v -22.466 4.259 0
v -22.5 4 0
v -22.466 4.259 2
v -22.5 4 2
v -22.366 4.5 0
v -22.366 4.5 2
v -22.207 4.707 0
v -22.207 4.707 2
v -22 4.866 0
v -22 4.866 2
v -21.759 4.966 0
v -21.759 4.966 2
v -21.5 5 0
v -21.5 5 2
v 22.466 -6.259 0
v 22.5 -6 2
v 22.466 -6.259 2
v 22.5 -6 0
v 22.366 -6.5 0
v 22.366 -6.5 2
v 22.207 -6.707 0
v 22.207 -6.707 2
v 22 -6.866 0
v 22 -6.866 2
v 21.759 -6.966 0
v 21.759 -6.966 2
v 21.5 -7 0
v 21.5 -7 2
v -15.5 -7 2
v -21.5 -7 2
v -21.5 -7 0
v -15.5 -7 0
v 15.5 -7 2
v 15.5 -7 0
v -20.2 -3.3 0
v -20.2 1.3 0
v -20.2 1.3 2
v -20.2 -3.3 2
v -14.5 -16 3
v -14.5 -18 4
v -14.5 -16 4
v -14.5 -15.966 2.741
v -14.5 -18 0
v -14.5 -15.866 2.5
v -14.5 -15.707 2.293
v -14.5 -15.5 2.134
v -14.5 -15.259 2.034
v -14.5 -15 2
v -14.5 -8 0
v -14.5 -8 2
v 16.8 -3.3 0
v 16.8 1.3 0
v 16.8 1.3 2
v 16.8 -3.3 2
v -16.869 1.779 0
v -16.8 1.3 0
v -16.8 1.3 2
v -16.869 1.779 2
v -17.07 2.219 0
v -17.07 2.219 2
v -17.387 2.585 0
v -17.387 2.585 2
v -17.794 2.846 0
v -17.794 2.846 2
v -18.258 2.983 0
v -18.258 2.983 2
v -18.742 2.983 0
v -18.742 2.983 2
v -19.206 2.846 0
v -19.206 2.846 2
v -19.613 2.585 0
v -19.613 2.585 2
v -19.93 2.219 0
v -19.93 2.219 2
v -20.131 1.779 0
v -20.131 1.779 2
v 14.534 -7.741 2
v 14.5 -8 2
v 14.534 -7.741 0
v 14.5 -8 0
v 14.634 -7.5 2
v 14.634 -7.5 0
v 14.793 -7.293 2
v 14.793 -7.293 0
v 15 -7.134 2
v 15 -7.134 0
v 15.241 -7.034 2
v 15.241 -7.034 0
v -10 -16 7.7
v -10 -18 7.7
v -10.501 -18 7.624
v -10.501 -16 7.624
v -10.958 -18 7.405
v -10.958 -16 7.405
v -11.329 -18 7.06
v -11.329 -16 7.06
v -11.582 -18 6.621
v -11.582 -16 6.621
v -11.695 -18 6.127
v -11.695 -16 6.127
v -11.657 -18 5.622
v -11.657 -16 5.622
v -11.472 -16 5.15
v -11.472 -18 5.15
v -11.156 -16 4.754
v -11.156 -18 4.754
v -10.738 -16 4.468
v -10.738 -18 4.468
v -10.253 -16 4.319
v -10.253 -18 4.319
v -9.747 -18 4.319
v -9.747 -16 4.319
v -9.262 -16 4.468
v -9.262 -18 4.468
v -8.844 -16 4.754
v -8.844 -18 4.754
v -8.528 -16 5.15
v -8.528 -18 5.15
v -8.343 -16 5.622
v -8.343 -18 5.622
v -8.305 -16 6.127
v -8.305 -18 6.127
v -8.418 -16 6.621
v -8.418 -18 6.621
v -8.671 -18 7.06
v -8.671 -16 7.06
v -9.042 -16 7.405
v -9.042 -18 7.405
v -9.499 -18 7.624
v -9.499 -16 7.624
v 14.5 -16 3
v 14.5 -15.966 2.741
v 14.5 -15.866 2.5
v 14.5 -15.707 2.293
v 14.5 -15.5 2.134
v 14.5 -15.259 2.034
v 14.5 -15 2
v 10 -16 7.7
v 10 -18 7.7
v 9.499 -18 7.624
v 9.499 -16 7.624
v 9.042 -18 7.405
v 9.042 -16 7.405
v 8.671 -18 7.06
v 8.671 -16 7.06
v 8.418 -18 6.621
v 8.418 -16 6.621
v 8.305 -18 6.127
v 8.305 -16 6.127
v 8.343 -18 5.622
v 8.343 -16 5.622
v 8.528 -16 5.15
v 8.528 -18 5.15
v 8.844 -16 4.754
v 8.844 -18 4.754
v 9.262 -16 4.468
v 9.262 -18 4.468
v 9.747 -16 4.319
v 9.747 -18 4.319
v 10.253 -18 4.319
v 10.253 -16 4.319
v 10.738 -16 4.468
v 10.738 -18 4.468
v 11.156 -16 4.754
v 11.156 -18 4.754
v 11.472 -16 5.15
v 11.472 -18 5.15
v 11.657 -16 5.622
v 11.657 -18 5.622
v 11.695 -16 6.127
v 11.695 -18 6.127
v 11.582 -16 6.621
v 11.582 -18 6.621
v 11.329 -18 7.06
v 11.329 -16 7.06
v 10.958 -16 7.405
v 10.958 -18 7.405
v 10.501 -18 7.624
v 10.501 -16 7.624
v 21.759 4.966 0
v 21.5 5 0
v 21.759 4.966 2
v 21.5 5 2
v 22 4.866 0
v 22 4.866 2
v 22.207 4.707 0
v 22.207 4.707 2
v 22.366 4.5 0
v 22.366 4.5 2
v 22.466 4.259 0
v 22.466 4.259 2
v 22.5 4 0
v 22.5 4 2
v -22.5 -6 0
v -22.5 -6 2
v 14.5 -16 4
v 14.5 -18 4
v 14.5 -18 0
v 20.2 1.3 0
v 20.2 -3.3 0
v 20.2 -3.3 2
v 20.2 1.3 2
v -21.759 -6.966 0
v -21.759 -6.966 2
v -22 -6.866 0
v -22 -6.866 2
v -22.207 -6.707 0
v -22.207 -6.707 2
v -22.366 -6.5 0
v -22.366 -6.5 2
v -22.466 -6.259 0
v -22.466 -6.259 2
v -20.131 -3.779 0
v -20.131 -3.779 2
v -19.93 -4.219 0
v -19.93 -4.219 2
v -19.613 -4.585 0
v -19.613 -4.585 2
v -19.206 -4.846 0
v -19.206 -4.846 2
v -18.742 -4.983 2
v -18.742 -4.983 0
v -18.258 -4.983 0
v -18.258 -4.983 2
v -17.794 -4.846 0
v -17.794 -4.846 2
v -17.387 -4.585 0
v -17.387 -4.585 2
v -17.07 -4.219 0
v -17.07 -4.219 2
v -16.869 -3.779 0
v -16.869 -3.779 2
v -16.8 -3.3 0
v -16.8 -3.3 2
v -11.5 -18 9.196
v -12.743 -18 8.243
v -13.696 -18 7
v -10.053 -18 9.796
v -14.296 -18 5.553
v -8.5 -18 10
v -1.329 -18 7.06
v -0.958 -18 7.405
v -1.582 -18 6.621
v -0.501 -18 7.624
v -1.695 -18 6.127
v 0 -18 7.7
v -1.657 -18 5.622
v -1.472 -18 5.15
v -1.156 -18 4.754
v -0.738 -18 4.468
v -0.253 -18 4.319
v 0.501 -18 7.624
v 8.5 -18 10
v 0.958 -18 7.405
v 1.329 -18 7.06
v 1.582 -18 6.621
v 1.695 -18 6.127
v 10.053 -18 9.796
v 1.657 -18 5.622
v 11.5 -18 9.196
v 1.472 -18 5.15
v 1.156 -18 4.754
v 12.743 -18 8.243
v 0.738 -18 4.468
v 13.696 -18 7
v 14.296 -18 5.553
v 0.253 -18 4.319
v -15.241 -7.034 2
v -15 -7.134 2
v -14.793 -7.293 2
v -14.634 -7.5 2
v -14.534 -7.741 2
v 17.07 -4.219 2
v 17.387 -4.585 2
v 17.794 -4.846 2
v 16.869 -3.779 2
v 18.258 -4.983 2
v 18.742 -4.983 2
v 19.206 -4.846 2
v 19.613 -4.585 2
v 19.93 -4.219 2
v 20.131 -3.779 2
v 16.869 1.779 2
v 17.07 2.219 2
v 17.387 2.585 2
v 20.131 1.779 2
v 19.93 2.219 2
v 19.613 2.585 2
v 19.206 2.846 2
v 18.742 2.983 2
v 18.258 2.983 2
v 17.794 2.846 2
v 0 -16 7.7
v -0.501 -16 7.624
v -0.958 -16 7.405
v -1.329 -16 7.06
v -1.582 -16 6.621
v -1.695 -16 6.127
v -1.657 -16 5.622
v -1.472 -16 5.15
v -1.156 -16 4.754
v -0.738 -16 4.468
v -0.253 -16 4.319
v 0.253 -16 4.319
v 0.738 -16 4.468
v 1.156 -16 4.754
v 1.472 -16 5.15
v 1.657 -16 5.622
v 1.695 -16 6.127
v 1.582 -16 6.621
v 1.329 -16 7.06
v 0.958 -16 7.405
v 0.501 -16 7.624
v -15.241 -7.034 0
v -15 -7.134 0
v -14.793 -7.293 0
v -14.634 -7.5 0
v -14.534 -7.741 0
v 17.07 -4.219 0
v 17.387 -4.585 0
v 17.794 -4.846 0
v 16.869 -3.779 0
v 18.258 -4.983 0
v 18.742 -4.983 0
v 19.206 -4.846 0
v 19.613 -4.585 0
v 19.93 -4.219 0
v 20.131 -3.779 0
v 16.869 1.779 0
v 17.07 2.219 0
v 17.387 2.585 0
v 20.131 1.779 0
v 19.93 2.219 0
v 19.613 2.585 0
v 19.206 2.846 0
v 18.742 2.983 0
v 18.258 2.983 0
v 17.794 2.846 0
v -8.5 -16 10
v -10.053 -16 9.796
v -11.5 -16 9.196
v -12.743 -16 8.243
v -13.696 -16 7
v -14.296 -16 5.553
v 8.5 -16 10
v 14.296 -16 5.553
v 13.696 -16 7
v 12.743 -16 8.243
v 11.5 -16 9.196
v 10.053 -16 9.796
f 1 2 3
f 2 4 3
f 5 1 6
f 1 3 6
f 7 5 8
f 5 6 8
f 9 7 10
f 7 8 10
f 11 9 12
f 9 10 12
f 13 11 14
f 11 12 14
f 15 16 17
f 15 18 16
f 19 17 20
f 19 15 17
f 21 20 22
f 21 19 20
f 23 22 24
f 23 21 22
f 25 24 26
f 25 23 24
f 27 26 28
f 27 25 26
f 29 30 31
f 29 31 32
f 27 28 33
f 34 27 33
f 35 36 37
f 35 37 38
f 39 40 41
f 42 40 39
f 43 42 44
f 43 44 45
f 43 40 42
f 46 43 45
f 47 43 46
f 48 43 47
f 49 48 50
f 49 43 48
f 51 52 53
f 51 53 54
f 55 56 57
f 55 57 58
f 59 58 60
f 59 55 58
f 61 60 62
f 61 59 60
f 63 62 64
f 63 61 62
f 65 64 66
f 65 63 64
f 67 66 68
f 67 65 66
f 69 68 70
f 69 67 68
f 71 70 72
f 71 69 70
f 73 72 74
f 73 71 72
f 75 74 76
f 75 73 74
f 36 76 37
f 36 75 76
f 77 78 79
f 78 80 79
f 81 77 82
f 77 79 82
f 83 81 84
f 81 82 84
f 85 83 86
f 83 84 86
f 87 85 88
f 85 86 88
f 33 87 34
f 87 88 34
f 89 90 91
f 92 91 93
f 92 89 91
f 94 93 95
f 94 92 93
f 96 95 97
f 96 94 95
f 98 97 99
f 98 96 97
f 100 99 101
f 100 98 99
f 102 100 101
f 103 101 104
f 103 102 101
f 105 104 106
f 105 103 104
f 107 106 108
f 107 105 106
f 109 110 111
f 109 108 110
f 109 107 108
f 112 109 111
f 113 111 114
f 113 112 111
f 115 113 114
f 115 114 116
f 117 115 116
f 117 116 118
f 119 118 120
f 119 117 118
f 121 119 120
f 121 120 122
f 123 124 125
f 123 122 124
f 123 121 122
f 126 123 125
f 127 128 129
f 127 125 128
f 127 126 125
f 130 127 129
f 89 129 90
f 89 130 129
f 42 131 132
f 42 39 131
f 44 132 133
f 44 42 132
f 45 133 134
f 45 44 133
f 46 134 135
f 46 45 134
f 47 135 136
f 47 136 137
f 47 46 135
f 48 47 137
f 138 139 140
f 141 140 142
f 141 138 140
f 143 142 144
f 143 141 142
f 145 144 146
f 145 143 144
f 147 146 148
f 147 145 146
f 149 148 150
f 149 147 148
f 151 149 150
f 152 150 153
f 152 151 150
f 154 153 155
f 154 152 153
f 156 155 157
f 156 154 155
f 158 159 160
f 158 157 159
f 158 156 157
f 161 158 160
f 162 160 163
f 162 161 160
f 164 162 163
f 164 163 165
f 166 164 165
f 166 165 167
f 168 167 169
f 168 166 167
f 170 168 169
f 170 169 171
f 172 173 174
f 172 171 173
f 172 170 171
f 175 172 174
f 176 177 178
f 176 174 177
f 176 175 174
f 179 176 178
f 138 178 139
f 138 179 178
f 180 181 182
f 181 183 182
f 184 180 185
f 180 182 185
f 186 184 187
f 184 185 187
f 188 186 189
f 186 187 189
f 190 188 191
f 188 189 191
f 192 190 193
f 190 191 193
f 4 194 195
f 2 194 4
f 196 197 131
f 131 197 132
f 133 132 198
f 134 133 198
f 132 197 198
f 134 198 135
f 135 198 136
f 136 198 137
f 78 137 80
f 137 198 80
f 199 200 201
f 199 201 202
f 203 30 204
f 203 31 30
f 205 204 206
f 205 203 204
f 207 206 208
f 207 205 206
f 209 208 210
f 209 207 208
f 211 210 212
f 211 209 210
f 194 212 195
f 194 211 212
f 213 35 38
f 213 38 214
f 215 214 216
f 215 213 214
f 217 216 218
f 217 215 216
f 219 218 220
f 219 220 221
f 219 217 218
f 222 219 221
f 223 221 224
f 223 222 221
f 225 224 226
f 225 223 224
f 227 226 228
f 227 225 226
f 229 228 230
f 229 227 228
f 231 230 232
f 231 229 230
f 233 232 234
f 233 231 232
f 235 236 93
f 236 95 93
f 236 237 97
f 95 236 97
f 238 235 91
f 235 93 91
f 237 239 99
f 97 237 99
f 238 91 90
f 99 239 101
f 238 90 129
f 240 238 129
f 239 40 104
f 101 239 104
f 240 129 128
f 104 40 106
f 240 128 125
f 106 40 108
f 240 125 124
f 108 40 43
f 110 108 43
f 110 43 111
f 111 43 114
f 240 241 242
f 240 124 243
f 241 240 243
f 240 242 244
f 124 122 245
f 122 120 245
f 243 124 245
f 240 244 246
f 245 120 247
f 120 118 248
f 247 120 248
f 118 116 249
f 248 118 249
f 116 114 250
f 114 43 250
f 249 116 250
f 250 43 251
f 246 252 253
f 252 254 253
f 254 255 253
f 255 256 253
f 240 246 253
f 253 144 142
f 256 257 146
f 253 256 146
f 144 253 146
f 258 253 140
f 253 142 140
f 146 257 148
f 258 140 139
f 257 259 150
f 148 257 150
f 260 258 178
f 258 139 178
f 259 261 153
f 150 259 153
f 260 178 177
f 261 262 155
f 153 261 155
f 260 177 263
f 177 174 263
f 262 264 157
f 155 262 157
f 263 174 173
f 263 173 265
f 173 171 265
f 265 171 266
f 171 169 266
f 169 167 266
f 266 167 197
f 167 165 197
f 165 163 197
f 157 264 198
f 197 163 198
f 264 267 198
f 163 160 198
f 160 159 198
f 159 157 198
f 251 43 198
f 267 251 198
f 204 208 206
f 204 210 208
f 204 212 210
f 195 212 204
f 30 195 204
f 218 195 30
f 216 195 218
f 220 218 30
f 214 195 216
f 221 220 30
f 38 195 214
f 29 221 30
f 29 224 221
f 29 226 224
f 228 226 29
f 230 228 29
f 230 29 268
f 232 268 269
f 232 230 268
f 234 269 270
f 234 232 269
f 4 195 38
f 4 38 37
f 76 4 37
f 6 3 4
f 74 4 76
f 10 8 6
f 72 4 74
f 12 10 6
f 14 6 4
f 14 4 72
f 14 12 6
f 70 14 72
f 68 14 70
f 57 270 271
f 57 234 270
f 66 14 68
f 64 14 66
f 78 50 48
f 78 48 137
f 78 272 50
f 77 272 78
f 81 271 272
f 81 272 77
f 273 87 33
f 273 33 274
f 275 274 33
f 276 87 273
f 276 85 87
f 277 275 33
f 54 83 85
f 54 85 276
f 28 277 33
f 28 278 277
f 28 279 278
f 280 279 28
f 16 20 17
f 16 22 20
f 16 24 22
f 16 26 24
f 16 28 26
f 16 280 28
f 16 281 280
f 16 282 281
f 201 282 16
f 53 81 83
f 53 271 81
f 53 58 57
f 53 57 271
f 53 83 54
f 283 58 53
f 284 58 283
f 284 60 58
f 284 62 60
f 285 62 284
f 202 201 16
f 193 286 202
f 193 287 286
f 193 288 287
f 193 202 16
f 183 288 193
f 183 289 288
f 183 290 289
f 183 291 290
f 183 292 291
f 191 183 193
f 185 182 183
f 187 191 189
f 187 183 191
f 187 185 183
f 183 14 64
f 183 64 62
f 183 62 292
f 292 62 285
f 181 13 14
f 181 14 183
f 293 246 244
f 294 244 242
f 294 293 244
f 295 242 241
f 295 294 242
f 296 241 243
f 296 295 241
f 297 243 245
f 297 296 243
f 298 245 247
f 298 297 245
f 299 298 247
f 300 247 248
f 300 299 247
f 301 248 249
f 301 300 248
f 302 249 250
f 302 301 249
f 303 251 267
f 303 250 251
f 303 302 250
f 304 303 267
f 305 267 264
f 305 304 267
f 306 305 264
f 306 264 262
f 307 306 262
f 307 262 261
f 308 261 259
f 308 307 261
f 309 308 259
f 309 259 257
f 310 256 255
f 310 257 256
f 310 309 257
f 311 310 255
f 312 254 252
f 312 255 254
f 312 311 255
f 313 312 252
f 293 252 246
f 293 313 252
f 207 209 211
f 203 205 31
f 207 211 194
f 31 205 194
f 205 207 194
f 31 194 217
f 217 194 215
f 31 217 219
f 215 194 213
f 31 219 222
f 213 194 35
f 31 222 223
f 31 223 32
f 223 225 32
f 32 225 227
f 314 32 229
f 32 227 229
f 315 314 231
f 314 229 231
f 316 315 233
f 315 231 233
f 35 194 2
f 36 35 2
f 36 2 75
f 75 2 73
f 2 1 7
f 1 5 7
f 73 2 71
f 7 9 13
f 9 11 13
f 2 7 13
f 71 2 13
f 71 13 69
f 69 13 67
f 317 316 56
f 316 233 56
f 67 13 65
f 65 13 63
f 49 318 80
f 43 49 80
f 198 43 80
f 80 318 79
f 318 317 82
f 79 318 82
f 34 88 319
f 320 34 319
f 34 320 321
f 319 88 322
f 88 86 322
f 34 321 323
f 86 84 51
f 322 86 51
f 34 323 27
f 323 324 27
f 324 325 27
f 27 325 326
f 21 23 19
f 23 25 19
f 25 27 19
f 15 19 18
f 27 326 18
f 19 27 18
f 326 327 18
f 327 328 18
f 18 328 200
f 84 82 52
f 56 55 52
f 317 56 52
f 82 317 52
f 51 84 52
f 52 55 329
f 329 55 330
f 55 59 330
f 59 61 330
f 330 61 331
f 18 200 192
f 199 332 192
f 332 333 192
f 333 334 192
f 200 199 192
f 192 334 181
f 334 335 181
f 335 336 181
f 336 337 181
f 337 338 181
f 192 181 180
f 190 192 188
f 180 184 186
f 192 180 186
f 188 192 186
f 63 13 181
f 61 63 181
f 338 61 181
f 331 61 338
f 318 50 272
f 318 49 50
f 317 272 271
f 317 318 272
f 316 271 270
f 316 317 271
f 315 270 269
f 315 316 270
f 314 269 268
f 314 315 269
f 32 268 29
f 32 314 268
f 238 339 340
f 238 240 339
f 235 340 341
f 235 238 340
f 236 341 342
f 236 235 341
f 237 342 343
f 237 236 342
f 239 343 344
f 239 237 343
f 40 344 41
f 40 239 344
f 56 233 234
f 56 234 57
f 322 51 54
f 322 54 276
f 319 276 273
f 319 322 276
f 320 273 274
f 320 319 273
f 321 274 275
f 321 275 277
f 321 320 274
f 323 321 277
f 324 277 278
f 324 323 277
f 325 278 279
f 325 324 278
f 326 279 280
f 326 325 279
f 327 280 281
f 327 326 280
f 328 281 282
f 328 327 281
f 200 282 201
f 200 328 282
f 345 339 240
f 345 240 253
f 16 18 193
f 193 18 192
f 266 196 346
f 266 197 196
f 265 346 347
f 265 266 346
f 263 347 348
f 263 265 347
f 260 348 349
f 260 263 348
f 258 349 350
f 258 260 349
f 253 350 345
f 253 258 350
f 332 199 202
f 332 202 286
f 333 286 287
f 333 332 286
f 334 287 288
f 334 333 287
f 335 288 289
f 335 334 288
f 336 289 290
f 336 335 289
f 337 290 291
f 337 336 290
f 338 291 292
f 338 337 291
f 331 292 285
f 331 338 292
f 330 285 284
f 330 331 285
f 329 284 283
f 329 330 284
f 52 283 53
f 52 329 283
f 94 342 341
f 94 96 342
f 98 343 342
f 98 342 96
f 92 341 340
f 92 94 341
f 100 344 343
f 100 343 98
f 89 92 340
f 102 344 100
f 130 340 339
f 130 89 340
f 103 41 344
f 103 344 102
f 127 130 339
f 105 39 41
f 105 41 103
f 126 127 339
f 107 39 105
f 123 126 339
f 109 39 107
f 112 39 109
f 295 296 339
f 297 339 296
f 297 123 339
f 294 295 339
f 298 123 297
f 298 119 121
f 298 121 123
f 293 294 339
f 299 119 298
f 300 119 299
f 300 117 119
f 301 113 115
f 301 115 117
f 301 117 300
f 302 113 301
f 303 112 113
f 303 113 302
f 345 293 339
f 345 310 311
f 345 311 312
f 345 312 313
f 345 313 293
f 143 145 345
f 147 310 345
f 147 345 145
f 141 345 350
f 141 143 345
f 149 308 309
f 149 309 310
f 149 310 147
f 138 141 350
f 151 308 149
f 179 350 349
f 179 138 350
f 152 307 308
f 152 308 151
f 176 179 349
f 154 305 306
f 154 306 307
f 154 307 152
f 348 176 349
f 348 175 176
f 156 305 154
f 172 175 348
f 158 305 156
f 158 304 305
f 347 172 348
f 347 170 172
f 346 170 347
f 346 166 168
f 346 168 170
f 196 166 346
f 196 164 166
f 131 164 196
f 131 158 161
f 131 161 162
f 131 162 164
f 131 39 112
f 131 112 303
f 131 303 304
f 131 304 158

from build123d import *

# Parameters (mm, degrees)
SKETCH_1_W             = 45
SKETCH_1_H             = 10
EXTRUDE_1_DEPTH        = 2
SKETCH_2_W             = 45
SKETCH_2_H             = 23
EXTRUDE_2_DEPTH        = 2
SKETCH_4_W             = 45
SKETCH_4_H             = 2
EXTRUDE_3_DEPTH        = 10
PATTERN_LINEAR_1_COUNT = 3
PATTERN_LINEAR_1_PITCH = 10
HOLE_WIZARD_M3_2_DEPTH = 2
SKETCH_9_W             = 8
SKETCH_9_H             = 2
CUT_EXTRUDE_1_DEPTH    = 30.904013109
FILLET_1_R             = 6
FILLET_3_R             = 1
CUT_EXTRUDE_2_REACH    = 31.904
SKETCH_11_W            = 8
SKETCH_11_H            = 11
FILLET_5_R             = 1


# Read off the part's stored shape, not the designer's step: M3 间隙槽口2
with BuildPart() as part:
    # 草图1 → 凸台-拉伸1 (new body)
    with BuildSketch(Plane.XY):
        Rectangle(SKETCH_1_W, SKETCH_1_H)
    extrude(amount=EXTRUDE_1_DEPTH)

    # 草图2 → 凸台-拉伸2 (add)
    with BuildSketch(Plane.XY):
        with Locations((0, -6.5)):
            Rectangle(SKETCH_2_W, SKETCH_2_H)
    extrude(amount=EXTRUDE_2_DEPTH)

    # 草图4 → 凸台-拉伸3 (add)
    with BuildSketch(Plane.XY):
        with Locations((0, -17)):
            Rectangle(SKETCH_4_W, SKETCH_4_H)
    extrude(amount=EXTRUDE_3_DEPTH)

    # 草图6 → M3 间隙孔1 (revolve, cut)
    with BuildSketch(Plane(origin=(-10, -16, 6), x_dir=(0, 0, 1), z_dir=(1, 0, 0))):
        Polygon((0, 0), (0, 9.521463052), (1.7, 8.5), (1.7, 0), align=None)
    hole_wizard_m3_1 = revolve(axis=Axis((-10, -9.65, 6), (0, -1, 0)), mode=Mode.SUBTRACT)

    # 阵列(线性)1: M3 间隙孔1 ×3
    with Locations(*[(i * PATTERN_LINEAR_1_PITCH, 0, 0) for i in range(1, PATTERN_LINEAR_1_COUNT)]):
        add(hole_wizard_m3_1, mode=Mode.SUBTRACT)

    # M3 间隙槽口2 outline → M3 间隙槽口2 (cut)
    with BuildSketch(Plane.XY):
        with BuildLine():
            ThreePointArc((20.2, 1.3), (18.5, 3), (16.8, 1.3))
            Line((16.8, 1.3), (16.8, -3.3))
            ThreePointArc((16.8, -3.3), (18.5, -5), (20.2, -3.3))
            Line((20.2, -3.3), (20.2, 1.3))
        make_face()
        with BuildLine():
            ThreePointArc((-16.8, 1.3), (-18.5, 3), (-20.2, 1.3))
            Line((-20.2, 1.3), (-20.2, -3.3))
            ThreePointArc((-20.2, -3.3), (-18.5, -5), (-16.8, -3.3))
            Line((-16.8, -3.3), (-16.8, 1.3))
        make_face()
    extrude(amount=HOLE_WIZARD_M3_2_DEPTH, mode=Mode.SUBTRACT)

    # 草图9 → 切除-拉伸1 (cut, through all)
    with BuildSketch(Plane.XY.offset(2)):
        with Locations((-18.5, -17)):
            Rectangle(SKETCH_9_W, SKETCH_9_H)
        with Locations((18.5, -17)):
            Rectangle(SKETCH_9_W, SKETCH_9_H)
    extrude(amount=CUT_EXTRUDE_1_DEPTH, mode=Mode.SUBTRACT)

    # 圆角1
    fillet_1_edges = [part.edges().sort_by_distance(p)[0] for p in [
        (-14.5, -17, 10),
        (14.5, -17, 10),
    ]]
    fillet(fillet_1_edges, radius=FILLET_1_R)

    # 圆角3
    fillet_3_edges = [part.edges().sort_by_distance(p)[0] for p in [
        (0, -16, 2),
    ]]
    fillet(fillet_3_edges, radius=FILLET_3_R)

    # 草图11 → 切除-拉伸2 (cut, up to next)
    with BuildSketch(Plane.XY.offset(2), mode=Mode.PRIVATE) as cut_extrude_2_sk1:
        with Locations((-18.5, -12.5)):
            Rectangle(SKETCH_11_W, SKETCH_11_H)
    cut_extrude_2_tool1 = extrude(cut_extrude_2_sk1.sketch, amount=-CUT_EXTRUDE_2_REACH, mode=Mode.PRIVATE) & part.part
    cut_extrude_2 = cut_extrude_2_tool1.solids().sort_by_distance((-18.5, -12.5, 2))[0]
    add(cut_extrude_2, mode=Mode.SUBTRACT)

    # 镜向1: 切除-拉伸2 across plane
    add(cut_extrude_2.mirror(Plane(origin=(0, 0, 0), x_dir=(0, 0, 1), z_dir=(1, 0, 0))), mode=Mode.SUBTRACT)

    # 圆角5
    fillet_5_edges = [part.edges().sort_by_distance(p)[0] for p in [
        (-22.5, -7, 1),
        (-14.5, -7, 1),
        (22.5, -7, 1),
        (14.5, -7, 1),
        (-22.5, 5, 1),
        (22.5, 5, 1),
    ]]
    fillet(fillet_5_edges, radius=FILLET_5_R)


solid = part.part
